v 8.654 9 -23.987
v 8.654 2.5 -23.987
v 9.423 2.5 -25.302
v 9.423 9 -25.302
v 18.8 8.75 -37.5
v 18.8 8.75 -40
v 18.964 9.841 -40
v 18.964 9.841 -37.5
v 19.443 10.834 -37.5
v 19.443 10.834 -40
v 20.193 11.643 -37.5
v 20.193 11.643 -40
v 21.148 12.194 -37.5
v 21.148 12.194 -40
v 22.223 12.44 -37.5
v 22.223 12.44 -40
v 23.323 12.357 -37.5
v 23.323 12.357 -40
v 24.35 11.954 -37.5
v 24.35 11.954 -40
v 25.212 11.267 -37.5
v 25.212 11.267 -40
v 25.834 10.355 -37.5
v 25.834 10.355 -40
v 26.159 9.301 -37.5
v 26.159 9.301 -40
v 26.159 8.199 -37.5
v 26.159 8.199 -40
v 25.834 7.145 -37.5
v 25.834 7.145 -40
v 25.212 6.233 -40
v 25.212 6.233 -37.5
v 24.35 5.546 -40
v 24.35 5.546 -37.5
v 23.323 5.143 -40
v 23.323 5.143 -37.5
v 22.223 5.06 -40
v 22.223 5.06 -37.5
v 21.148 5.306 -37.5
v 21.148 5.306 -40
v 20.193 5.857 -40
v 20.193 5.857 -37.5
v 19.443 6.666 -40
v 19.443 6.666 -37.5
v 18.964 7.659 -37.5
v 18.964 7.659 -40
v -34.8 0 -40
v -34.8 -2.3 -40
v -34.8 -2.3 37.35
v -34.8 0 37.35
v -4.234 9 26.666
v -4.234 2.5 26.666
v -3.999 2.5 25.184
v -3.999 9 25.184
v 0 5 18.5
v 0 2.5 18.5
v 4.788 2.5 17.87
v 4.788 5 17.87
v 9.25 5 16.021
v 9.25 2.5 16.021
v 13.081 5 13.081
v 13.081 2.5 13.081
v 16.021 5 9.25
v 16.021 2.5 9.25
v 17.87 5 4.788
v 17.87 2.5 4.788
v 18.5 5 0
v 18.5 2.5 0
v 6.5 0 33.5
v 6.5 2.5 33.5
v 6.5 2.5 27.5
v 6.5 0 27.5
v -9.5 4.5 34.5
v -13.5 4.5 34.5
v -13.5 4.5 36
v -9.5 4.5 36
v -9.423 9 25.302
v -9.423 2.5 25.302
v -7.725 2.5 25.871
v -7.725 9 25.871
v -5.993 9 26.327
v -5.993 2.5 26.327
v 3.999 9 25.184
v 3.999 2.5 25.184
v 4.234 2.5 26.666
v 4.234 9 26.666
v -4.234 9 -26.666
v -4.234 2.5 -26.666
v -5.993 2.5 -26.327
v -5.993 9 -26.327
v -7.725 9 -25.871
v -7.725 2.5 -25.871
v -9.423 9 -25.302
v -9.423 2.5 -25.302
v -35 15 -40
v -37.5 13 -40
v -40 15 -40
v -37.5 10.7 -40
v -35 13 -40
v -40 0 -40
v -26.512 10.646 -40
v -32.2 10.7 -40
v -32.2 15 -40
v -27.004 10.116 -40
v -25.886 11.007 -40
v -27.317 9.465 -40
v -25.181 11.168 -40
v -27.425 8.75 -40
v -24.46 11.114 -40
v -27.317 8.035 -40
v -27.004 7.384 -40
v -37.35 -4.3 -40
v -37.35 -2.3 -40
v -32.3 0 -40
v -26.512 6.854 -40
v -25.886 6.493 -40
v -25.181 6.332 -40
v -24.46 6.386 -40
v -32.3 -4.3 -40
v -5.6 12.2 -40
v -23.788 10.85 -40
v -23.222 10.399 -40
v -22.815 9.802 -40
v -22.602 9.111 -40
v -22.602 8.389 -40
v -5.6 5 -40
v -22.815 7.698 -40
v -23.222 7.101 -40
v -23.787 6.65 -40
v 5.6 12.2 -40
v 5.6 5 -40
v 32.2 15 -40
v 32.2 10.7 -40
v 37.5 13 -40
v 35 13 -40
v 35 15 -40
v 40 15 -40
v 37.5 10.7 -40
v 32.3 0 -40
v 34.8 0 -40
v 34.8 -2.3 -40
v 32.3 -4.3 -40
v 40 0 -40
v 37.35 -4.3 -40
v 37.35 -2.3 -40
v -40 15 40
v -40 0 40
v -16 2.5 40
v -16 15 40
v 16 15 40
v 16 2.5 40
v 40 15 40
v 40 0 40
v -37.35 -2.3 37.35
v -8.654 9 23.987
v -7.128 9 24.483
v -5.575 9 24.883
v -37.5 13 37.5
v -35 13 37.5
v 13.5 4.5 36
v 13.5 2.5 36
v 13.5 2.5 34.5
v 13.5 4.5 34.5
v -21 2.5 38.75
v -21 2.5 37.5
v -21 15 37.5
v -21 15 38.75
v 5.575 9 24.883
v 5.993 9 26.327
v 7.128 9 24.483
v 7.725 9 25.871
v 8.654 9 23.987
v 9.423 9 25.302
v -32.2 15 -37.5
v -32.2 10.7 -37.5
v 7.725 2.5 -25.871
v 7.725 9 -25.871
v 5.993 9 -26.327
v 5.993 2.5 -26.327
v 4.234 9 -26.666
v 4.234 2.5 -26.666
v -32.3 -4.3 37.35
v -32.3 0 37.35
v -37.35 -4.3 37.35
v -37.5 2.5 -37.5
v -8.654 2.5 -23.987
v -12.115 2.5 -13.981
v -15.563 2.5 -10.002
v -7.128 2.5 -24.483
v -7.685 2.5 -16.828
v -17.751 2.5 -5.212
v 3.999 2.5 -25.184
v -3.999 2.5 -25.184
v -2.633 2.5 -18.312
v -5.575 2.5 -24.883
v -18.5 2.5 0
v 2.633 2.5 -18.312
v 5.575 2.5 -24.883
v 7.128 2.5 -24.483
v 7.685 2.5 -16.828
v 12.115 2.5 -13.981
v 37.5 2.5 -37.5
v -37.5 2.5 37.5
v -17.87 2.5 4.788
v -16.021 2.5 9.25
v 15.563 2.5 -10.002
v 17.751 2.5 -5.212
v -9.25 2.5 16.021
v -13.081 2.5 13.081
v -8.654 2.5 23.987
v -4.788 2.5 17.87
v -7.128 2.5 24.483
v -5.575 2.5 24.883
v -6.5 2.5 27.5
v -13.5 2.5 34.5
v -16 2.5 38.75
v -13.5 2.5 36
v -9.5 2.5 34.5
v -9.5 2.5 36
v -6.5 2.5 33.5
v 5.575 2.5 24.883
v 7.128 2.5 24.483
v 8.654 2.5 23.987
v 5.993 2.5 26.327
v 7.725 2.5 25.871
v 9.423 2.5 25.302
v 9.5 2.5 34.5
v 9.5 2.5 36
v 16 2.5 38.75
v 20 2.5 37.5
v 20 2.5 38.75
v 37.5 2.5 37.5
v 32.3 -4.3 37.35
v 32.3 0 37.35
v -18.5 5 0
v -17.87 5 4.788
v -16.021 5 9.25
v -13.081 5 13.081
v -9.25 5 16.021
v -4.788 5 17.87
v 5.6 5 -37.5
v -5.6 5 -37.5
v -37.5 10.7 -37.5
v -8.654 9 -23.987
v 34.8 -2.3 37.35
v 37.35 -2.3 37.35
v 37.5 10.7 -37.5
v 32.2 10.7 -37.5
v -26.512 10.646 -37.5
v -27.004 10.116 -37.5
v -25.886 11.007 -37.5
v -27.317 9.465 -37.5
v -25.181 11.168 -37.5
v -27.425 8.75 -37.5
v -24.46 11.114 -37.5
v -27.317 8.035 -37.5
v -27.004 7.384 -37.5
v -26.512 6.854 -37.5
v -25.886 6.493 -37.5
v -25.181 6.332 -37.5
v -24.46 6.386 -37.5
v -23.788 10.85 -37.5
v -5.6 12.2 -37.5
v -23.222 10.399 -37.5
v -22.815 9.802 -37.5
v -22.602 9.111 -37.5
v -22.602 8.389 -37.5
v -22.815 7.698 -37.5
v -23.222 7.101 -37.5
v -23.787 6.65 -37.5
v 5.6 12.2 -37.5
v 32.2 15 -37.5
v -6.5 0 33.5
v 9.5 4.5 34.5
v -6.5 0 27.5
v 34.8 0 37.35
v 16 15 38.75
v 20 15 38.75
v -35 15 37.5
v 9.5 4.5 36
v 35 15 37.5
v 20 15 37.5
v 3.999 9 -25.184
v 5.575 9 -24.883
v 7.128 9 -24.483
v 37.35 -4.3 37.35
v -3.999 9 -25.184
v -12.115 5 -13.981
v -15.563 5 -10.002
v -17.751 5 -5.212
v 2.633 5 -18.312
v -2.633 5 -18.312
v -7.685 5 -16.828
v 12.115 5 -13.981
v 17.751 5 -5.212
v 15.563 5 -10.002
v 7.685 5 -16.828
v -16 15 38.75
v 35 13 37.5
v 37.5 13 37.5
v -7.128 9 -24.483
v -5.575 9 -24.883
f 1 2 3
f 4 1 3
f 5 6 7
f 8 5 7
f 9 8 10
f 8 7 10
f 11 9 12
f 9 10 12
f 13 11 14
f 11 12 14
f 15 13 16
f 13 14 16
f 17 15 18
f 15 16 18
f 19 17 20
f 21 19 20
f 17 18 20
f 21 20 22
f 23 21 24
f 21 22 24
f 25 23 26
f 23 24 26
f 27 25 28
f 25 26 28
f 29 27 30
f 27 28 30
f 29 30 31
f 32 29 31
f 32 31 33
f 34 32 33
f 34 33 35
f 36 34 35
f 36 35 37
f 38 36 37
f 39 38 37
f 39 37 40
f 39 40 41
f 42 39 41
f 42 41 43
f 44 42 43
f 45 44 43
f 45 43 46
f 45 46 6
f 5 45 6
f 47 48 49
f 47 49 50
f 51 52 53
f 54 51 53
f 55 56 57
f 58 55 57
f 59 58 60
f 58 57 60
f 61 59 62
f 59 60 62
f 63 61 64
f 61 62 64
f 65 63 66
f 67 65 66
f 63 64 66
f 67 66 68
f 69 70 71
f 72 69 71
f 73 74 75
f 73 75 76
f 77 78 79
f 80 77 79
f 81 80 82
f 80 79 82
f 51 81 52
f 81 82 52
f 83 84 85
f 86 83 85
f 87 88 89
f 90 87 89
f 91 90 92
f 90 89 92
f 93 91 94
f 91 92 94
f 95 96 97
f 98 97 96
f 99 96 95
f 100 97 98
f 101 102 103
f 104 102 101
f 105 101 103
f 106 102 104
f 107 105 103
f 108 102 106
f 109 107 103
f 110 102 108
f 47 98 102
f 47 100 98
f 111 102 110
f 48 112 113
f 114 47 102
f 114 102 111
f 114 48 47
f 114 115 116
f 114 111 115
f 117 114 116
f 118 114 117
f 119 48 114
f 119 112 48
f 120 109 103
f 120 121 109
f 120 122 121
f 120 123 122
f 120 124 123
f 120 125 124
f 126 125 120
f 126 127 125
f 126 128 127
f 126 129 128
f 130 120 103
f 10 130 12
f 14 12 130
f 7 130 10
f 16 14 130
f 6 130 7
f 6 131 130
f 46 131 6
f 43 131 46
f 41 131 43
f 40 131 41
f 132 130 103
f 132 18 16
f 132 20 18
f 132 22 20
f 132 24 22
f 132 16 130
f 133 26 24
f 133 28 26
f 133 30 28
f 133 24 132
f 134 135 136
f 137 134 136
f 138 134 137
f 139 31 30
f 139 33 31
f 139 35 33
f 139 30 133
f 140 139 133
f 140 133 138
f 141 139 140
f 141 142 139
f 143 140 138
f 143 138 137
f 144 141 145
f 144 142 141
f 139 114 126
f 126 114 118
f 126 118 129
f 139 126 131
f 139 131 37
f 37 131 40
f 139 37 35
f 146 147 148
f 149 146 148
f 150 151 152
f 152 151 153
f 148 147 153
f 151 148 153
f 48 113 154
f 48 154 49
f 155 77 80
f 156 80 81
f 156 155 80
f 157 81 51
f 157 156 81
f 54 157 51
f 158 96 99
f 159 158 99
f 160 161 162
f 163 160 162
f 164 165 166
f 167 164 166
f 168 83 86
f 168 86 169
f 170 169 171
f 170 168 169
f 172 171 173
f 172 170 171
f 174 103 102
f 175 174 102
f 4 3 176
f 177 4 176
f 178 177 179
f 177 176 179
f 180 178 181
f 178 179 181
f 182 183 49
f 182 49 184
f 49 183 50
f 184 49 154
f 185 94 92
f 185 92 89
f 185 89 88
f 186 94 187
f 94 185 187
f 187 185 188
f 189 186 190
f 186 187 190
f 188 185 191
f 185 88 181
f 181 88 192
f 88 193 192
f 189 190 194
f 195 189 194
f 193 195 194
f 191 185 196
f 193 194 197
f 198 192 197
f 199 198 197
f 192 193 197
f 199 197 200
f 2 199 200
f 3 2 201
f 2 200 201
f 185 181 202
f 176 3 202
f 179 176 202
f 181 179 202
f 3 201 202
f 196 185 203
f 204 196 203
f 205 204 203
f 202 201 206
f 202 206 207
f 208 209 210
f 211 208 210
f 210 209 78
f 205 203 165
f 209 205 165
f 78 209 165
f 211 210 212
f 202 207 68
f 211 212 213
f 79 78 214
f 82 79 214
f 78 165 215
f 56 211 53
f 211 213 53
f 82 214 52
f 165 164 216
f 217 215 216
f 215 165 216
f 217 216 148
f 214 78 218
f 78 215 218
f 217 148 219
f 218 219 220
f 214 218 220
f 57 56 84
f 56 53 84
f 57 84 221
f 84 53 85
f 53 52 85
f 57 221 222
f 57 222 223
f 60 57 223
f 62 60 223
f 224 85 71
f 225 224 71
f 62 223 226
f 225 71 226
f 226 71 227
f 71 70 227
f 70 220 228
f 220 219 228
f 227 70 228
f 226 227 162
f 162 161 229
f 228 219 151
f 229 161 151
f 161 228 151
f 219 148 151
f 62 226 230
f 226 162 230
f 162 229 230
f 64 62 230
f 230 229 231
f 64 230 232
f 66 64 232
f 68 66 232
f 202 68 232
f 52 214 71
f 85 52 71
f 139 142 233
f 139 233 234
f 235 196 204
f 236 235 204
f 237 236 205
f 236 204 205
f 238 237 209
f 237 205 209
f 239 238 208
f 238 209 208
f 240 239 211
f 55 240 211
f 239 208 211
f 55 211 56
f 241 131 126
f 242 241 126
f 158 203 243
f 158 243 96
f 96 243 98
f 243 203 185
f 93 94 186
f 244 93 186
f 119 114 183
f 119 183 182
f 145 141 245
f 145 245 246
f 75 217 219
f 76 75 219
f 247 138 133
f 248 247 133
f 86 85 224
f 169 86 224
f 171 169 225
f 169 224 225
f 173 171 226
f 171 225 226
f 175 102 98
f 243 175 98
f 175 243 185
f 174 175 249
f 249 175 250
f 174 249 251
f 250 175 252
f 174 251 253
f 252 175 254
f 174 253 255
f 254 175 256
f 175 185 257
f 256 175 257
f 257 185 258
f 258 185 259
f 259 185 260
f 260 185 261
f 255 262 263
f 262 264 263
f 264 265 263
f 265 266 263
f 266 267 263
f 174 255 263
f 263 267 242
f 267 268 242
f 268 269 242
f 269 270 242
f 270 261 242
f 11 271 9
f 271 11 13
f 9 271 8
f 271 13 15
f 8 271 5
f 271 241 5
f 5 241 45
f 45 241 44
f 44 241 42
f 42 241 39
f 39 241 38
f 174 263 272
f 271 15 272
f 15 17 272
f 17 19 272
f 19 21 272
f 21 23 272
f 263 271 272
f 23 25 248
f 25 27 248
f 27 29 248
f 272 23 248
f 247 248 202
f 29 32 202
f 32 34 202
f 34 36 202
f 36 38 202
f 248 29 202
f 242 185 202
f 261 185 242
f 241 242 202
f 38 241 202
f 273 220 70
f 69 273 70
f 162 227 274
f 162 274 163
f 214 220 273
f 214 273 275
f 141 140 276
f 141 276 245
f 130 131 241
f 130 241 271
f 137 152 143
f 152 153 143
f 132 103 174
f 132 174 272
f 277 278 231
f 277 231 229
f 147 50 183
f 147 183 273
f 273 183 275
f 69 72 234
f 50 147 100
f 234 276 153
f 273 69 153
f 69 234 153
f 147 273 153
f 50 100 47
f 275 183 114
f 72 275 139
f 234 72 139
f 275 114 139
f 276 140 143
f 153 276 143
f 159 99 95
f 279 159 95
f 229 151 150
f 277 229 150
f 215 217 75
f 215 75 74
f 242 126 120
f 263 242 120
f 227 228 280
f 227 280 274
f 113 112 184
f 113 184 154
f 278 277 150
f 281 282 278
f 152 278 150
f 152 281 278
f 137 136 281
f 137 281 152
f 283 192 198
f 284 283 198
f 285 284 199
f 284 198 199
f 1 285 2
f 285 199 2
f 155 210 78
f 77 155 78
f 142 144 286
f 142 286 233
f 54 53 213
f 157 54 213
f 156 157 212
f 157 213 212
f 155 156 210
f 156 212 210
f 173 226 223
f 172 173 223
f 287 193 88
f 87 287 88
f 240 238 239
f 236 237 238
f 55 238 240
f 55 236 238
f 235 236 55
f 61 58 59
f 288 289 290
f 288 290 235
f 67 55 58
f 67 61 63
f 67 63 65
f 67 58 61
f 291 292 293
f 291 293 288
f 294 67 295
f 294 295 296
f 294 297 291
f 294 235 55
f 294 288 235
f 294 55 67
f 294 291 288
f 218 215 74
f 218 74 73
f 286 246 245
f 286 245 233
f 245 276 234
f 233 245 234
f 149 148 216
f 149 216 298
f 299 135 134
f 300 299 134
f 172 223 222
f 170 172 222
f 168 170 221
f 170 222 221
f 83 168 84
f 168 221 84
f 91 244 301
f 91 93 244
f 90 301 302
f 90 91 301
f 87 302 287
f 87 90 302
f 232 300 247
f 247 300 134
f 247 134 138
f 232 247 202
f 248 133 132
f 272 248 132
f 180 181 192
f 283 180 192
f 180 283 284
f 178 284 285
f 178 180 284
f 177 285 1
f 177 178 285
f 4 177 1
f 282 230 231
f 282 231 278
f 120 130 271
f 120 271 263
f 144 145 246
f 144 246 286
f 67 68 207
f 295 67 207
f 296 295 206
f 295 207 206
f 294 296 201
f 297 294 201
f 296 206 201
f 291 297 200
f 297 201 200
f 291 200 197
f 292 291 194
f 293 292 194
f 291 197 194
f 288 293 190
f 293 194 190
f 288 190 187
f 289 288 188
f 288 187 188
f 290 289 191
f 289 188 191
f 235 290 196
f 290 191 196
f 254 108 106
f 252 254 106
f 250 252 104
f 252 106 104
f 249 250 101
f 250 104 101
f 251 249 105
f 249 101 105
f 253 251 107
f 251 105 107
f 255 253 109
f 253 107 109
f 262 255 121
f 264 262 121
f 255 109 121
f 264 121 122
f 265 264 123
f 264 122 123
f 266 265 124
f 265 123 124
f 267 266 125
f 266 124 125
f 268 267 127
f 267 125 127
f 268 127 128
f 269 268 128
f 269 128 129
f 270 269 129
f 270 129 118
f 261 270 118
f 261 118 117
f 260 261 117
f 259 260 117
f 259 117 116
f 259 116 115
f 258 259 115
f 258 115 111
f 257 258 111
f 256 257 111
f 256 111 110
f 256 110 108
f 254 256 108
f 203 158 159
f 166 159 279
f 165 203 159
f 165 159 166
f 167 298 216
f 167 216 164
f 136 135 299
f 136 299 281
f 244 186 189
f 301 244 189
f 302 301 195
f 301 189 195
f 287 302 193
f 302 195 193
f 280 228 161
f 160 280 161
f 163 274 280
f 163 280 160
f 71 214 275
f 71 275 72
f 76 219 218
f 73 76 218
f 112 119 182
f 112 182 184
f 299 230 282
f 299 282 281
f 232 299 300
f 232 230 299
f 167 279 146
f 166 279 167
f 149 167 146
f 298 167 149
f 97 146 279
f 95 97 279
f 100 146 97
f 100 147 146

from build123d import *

# Parameters (mm, degrees)
SKETCH1_W           = 80
SKETCH1_H           = 80
BOSS_EXTRUDE1_DEPTH = 2.5
SKETCH3_W           = 80
SKETCH3_H           = 80
SKETCH3_W_2         = 75
SKETCH3_H_2         = 75
BOSS_EXTRUDE2_DEPTH = 12.5
BOSS_EXTRUDE3_DEPTH = 6.5
SKETCH5_W           = 13
SKETCH5_H           = 6
CUT_EXTRUDE1_DEPTH  = 58.933151131
CUT_EXTRUDE2_REACH  = 92.692
SKETCH6_W           = 32
SKETCH6_H           = 12.5
CUT_EXTRUDE3_REACH  = 92.692
SKETCH7_W           = 11.2
SKETCH7_H           = 7.2
BOSS_EXTRUDE4_DEPTH = 77.35
CUT_EXTRUDE4_REACH  = 92.692
BOSS_EXTRUDE5_REACH = 90.494
SKETCH15_W          = 2.5
SKETCH15_H          = 2
BOSS_EXTRUDE6_DEPTH = 2.5
SKETCH16_W          = 5
SKETCH16_H          = 12.5
SKETCH16_W_2        = 4
CUT_EXTRUDE5_DEPTH  = 1.25
SKETCH17_W          = 4
SKETCH17_H          = 1.5
BOSS_EXTRUDE7_DEPTH = 2
CUT_EXTRUDE7_REACH  = 92.692
SKETCH18_R          = 3.7
CUT_EXTRUDE8_REACH  = 92.692
SKETCH19_R          = 2.425


with BuildPart() as part:
    # Sketch1 → Boss-Extrude1 (new body)
    with BuildSketch(Plane(origin=(0, 0, 0), x_dir=(1, 0, 0), z_dir=(0, 1, 0))):
        Rectangle(SKETCH1_W, SKETCH1_H)
    extrude(amount=BOSS_EXTRUDE1_DEPTH)

    # Sketch3 → Boss-Extrude2 (add)
    with BuildSketch(Plane(origin=(0, 2.5, 0), x_dir=(1, 0, 0), z_dir=(0, 1, 0))):
        Rectangle(SKETCH3_W, SKETCH3_H)
        Rectangle(SKETCH3_W_2, SKETCH3_H_2, mode=Mode.SUBTRACT)
    extrude(amount=BOSS_EXTRUDE2_DEPTH)

    # Sketch2 → Boss-Extrude3 (add)
    with BuildSketch(Plane(origin=(0, 2.5, 0), x_dir=(1, 0, 0), z_dir=(0, 1, 0))):
        with BuildLine():
            ThreePointArc((-8.653956432, 23.98664291), (-6.354755269, 24.695487148), (-3.998981529, 25.184482261))
            Line((-3.998981529, 25.184482261), (-4.234215736, 26.665922394))
            ThreePointArc((-4.234215736, 26.665922394), (-6.862755968, 26.113264455), (-9.423377938, 25.302172797))
            Line((-9.423377938, 25.302172797), (-8.653956432, 23.98664291))
        make_face()
        with BuildLine():
            Line((4.234215736, 26.665922394), (3.998981529, 25.184482261))
            ThreePointArc((3.998981529, 25.184482261), (6.354755269, 24.695487148), (8.653956432, 23.98664291))
            Line((8.653956432, 23.98664291), (9.423377938, 25.302172797))
            ThreePointArc((9.423377938, 25.302172797), (6.862755968, 26.113264455), (4.234215736, 26.665922394))
        make_face()
        with BuildLine():
            Line((-8.653956432, -23.98664291), (-9.423377938, -25.302172797))
            ThreePointArc((-9.423377938, -25.302172797), (-6.862755968, -26.113264455), (-4.234215736, -26.665922394))
            Line((-4.234215736, -26.665922394), (-3.998981529, -25.184482261))
            ThreePointArc((-3.998981529, -25.184482261), (-6.354755269, -24.695487148), (-8.653956432, -23.98664291))
        make_face()
        with BuildLine():
            Line((9.423377938, -25.302172797), (8.653956432, -23.98664291))
            ThreePointArc((8.653956432, -23.98664291), (6.354755269, -24.695487148), (3.998981529, -25.184482261))
            Line((3.998981529, -25.184482261), (4.234215736, -26.665922394))
            ThreePointArc((4.234215736, -26.665922394), (6.862755968, -26.113264455), (9.423377938, -25.302172797))
        make_face()
    extrude(amount=BOSS_EXTRUDE3_DEPTH)

    # Sketch5 → Cut-Extrude1 (cut, through all)
    with BuildSketch(Plane(origin=(0, 2.5, 0), x_dir=(1, 0, 0), z_dir=(0, 1, 0))):
        with Locations((0, -30.5)):
            Rectangle(SKETCH5_W, SKETCH5_H)
    extrude(amount=-CUT_EXTRUDE1_DEPTH, mode=Mode.SUBTRACT)

    # Sketch6 → Cut-Extrude2 (cut, up to next)
    with BuildSketch(Plane.XY.offset(40), mode=Mode.PRIVATE) as cut_extrude2_sk1:
        with Locations((0, 8.75)):
            Rectangle(SKETCH6_W, SKETCH6_H)
    cut_extrude2_tool1 = extrude(cut_extrude2_sk1.sketch, amount=-CUT_EXTRUDE2_REACH, mode=Mode.PRIVATE) & part.part
    add(cut_extrude2_tool1.solids().sort_by_distance((0, 8.75, 40))[0], mode=Mode.SUBTRACT)

    # Sketch7 → Cut-Extrude3 (cut, up to next)
    with BuildSketch(Plane(origin=(0, 0, -40), x_dir=(-1, 0, 0), z_dir=(0, 0, -1)), mode=Mode.PRIVATE) as cut_extrude3_sk1:
        with Locations((0, 8.6)):
            Rectangle(SKETCH7_W, SKETCH7_H)
    cut_extrude3_tool1 = extrude(cut_extrude3_sk1.sketch, amount=-CUT_EXTRUDE3_REACH, mode=Mode.PRIVATE) & part.part
    add(cut_extrude3_tool1.solids().sort_by_distance((0, 8.6, -40))[0], mode=Mode.SUBTRACT)

    # Sketch9 → Boss-Extrude4 (add)
    with BuildSketch(Plane(origin=(0, 0, -40), x_dir=(-1, 0, 0), z_dir=(0, 0, -1))):
        Polygon((34.8, 0), (32.3, 0), (32.3, -4.3), (37.35, -4.3), (37.35, -2.3), (34.8, -2.3), align=None)
        Polygon((-32.3, 0), (-34.8, 0), (-34.8, -2.3), (-37.35, -2.3), (-37.35, -4.3), (-32.3, -4.3), align=None)
    extrude(amount=-BOSS_EXTRUDE4_DEPTH)

    # Sketch10 → Cut-Extrude4 (cut, up to next)
    with BuildSketch(Plane(origin=(0, 0, -40), x_dir=(-1, 0, 0), z_dir=(0, 0, -1)), mode=Mode.PRIVATE) as cut_extrude4_sk1:
        Polygon((-32.2, 15), (-35, 15), (-35, 13), (-37.5, 13), (-37.5, 10.7), (-32.2, 10.7), align=None)
    cut_extrude4_tool1 = extrude(cut_extrude4_sk1.sketch, amount=-CUT_EXTRUDE4_REACH, mode=Mode.PRIVATE) & part.part
    # Sketch10 → Cut-Extrude4 (cut, up to next)
    with BuildSketch(Plane(origin=(0, 0, -40), x_dir=(-1, 0, 0), z_dir=(0, 0, -1)), mode=Mode.PRIVATE) as cut_extrude4_sk2:
        Polygon((35, 15), (32.2, 15), (32.2, 10.7), (37.5, 10.7), (37.5, 13), (35, 13), align=None)
    cut_extrude4_tool2 = extrude(cut_extrude4_sk2.sketch, amount=-CUT_EXTRUDE4_REACH, mode=Mode.PRIVATE) & part.part
    add(cut_extrude4_tool1.solids().sort_by_distance((34.456521, 12.526785, -40))[0], mode=Mode.SUBTRACT)
    add(cut_extrude4_tool2.solids().sort_by_distance((-34.456521, 12.526785, -40))[0], mode=Mode.SUBTRACT)

    # Sketch15 → Boss-Extrude5 (add, up to next)
    with BuildSketch(Plane.XY.offset(-37.5), mode=Mode.PRIVATE) as boss_extrude5_sk1:
        with Locations((36.25, 14)):
            Rectangle(SKETCH15_W, SKETCH15_H)
    boss_extrude5_tool1 = extrude(boss_extrude5_sk1.sketch, amount=BOSS_EXTRUDE5_REACH, mode=Mode.PRIVATE) - part.part
    # Sketch15 → Boss-Extrude5 (add, up to next)
    with BuildSketch(Plane.XY.offset(-37.5), mode=Mode.PRIVATE) as boss_extrude5_sk2:
        with Locations((-36.25, 14)):
            Rectangle(SKETCH15_W, SKETCH15_H)
    boss_extrude5_tool2 = extrude(boss_extrude5_sk2.sketch, amount=BOSS_EXTRUDE5_REACH, mode=Mode.PRIVATE) - part.part
    add(boss_extrude5_tool1.solids().sort_by_distance((36.25, 14, -37.5))[0])
    add(boss_extrude5_tool2.solids().sort_by_distance((-36.25, 14, -37.5))[0])

    # Sketch2<3> → Boss-Extrude6 (add)
    with BuildSketch(Plane(origin=(0, 2.5, 0), x_dir=(1, 0, 0), z_dir=(0, 1, 0))):
        with BuildLine():
            ThreePointArc((18.5, 0), (0, 18.5), (-18.5, 0))
            Line((-18.5, 0), (0, 0))
            Line((0, 0), (0, -18.5))
            ThreePointArc((0, -18.5), (13.081475452, -13.081475452), (18.5, 0))
        make_face()
        with BuildLine():
            Line((0, 0), (-18.5, 0))
            ThreePointArc((-18.5, 0), (-13.081475452, -13.081475452), (0, -18.5))
            Line((0, -18.5), (0, 0))
        make_face()
    extrude(amount=BOSS_EXTRUDE6_DEPTH)

    # Sketch16 → Cut-Extrude5 (cut)
    with BuildSketch(Plane(origin=(0, 0, 37.5), x_dir=(-1, 0, 0), z_dir=(0, 0, -1))):
        with Locations((18.5, 8.75)):
            Rectangle(SKETCH16_W, SKETCH16_H)
        with Locations((-18, 8.75)):
            Rectangle(SKETCH16_W_2, SKETCH16_H)
    extrude(amount=-CUT_EXTRUDE5_DEPTH, mode=Mode.SUBTRACT)

    # Sketch17 → Boss-Extrude7 (add)
    with BuildSketch(Plane(origin=(0, 2.5, 0), x_dir=(1, 0, 0), z_dir=(0, 1, 0))):
        with Locations((-11.5, -35.25)):
            Rectangle(SKETCH17_W, SKETCH17_H)
        with Locations((11.5, -35.25)):
            Rectangle(SKETCH17_W, SKETCH17_H)
    extrude(amount=BOSS_EXTRUDE7_DEPTH)

    # Sketch18 → Cut-Extrude7 (cut, up to next)
    with BuildSketch(Plane(origin=(0, 0, -40), x_dir=(-1, 0, 0), z_dir=(0, 0, -1)), mode=Mode.PRIVATE) as cut_extrude7_sk1:
        with Locations((-22.5, 8.75)):
            Circle(SKETCH18_R)
    cut_extrude7_tool1 = extrude(cut_extrude7_sk1.sketch, amount=-CUT_EXTRUDE7_REACH, mode=Mode.PRIVATE) & part.part
    add(cut_extrude7_tool1.solids().sort_by_distance((22.5, 8.75, -40))[0], mode=Mode.SUBTRACT)

    # Sketch19 → Cut-Extrude8 (cut, up to next)
    with BuildSketch(Plane(origin=(0, 0, -40), x_dir=(-1, 0, 0), z_dir=(0, 0, -1)), mode=Mode.PRIVATE) as cut_extrude8_sk1:
        with Locations((25, 8.75)):
            Circle(SKETCH19_R)
    cut_extrude8_tool1 = extrude(cut_extrude8_sk1.sketch, amount=-CUT_EXTRUDE8_REACH, mode=Mode.PRIVATE) & part.part
    add(cut_extrude8_tool1.solids().sort_by_distance((-25, 8.75, -40))[0], mode=Mode.SUBTRACT)


solid = part.part
